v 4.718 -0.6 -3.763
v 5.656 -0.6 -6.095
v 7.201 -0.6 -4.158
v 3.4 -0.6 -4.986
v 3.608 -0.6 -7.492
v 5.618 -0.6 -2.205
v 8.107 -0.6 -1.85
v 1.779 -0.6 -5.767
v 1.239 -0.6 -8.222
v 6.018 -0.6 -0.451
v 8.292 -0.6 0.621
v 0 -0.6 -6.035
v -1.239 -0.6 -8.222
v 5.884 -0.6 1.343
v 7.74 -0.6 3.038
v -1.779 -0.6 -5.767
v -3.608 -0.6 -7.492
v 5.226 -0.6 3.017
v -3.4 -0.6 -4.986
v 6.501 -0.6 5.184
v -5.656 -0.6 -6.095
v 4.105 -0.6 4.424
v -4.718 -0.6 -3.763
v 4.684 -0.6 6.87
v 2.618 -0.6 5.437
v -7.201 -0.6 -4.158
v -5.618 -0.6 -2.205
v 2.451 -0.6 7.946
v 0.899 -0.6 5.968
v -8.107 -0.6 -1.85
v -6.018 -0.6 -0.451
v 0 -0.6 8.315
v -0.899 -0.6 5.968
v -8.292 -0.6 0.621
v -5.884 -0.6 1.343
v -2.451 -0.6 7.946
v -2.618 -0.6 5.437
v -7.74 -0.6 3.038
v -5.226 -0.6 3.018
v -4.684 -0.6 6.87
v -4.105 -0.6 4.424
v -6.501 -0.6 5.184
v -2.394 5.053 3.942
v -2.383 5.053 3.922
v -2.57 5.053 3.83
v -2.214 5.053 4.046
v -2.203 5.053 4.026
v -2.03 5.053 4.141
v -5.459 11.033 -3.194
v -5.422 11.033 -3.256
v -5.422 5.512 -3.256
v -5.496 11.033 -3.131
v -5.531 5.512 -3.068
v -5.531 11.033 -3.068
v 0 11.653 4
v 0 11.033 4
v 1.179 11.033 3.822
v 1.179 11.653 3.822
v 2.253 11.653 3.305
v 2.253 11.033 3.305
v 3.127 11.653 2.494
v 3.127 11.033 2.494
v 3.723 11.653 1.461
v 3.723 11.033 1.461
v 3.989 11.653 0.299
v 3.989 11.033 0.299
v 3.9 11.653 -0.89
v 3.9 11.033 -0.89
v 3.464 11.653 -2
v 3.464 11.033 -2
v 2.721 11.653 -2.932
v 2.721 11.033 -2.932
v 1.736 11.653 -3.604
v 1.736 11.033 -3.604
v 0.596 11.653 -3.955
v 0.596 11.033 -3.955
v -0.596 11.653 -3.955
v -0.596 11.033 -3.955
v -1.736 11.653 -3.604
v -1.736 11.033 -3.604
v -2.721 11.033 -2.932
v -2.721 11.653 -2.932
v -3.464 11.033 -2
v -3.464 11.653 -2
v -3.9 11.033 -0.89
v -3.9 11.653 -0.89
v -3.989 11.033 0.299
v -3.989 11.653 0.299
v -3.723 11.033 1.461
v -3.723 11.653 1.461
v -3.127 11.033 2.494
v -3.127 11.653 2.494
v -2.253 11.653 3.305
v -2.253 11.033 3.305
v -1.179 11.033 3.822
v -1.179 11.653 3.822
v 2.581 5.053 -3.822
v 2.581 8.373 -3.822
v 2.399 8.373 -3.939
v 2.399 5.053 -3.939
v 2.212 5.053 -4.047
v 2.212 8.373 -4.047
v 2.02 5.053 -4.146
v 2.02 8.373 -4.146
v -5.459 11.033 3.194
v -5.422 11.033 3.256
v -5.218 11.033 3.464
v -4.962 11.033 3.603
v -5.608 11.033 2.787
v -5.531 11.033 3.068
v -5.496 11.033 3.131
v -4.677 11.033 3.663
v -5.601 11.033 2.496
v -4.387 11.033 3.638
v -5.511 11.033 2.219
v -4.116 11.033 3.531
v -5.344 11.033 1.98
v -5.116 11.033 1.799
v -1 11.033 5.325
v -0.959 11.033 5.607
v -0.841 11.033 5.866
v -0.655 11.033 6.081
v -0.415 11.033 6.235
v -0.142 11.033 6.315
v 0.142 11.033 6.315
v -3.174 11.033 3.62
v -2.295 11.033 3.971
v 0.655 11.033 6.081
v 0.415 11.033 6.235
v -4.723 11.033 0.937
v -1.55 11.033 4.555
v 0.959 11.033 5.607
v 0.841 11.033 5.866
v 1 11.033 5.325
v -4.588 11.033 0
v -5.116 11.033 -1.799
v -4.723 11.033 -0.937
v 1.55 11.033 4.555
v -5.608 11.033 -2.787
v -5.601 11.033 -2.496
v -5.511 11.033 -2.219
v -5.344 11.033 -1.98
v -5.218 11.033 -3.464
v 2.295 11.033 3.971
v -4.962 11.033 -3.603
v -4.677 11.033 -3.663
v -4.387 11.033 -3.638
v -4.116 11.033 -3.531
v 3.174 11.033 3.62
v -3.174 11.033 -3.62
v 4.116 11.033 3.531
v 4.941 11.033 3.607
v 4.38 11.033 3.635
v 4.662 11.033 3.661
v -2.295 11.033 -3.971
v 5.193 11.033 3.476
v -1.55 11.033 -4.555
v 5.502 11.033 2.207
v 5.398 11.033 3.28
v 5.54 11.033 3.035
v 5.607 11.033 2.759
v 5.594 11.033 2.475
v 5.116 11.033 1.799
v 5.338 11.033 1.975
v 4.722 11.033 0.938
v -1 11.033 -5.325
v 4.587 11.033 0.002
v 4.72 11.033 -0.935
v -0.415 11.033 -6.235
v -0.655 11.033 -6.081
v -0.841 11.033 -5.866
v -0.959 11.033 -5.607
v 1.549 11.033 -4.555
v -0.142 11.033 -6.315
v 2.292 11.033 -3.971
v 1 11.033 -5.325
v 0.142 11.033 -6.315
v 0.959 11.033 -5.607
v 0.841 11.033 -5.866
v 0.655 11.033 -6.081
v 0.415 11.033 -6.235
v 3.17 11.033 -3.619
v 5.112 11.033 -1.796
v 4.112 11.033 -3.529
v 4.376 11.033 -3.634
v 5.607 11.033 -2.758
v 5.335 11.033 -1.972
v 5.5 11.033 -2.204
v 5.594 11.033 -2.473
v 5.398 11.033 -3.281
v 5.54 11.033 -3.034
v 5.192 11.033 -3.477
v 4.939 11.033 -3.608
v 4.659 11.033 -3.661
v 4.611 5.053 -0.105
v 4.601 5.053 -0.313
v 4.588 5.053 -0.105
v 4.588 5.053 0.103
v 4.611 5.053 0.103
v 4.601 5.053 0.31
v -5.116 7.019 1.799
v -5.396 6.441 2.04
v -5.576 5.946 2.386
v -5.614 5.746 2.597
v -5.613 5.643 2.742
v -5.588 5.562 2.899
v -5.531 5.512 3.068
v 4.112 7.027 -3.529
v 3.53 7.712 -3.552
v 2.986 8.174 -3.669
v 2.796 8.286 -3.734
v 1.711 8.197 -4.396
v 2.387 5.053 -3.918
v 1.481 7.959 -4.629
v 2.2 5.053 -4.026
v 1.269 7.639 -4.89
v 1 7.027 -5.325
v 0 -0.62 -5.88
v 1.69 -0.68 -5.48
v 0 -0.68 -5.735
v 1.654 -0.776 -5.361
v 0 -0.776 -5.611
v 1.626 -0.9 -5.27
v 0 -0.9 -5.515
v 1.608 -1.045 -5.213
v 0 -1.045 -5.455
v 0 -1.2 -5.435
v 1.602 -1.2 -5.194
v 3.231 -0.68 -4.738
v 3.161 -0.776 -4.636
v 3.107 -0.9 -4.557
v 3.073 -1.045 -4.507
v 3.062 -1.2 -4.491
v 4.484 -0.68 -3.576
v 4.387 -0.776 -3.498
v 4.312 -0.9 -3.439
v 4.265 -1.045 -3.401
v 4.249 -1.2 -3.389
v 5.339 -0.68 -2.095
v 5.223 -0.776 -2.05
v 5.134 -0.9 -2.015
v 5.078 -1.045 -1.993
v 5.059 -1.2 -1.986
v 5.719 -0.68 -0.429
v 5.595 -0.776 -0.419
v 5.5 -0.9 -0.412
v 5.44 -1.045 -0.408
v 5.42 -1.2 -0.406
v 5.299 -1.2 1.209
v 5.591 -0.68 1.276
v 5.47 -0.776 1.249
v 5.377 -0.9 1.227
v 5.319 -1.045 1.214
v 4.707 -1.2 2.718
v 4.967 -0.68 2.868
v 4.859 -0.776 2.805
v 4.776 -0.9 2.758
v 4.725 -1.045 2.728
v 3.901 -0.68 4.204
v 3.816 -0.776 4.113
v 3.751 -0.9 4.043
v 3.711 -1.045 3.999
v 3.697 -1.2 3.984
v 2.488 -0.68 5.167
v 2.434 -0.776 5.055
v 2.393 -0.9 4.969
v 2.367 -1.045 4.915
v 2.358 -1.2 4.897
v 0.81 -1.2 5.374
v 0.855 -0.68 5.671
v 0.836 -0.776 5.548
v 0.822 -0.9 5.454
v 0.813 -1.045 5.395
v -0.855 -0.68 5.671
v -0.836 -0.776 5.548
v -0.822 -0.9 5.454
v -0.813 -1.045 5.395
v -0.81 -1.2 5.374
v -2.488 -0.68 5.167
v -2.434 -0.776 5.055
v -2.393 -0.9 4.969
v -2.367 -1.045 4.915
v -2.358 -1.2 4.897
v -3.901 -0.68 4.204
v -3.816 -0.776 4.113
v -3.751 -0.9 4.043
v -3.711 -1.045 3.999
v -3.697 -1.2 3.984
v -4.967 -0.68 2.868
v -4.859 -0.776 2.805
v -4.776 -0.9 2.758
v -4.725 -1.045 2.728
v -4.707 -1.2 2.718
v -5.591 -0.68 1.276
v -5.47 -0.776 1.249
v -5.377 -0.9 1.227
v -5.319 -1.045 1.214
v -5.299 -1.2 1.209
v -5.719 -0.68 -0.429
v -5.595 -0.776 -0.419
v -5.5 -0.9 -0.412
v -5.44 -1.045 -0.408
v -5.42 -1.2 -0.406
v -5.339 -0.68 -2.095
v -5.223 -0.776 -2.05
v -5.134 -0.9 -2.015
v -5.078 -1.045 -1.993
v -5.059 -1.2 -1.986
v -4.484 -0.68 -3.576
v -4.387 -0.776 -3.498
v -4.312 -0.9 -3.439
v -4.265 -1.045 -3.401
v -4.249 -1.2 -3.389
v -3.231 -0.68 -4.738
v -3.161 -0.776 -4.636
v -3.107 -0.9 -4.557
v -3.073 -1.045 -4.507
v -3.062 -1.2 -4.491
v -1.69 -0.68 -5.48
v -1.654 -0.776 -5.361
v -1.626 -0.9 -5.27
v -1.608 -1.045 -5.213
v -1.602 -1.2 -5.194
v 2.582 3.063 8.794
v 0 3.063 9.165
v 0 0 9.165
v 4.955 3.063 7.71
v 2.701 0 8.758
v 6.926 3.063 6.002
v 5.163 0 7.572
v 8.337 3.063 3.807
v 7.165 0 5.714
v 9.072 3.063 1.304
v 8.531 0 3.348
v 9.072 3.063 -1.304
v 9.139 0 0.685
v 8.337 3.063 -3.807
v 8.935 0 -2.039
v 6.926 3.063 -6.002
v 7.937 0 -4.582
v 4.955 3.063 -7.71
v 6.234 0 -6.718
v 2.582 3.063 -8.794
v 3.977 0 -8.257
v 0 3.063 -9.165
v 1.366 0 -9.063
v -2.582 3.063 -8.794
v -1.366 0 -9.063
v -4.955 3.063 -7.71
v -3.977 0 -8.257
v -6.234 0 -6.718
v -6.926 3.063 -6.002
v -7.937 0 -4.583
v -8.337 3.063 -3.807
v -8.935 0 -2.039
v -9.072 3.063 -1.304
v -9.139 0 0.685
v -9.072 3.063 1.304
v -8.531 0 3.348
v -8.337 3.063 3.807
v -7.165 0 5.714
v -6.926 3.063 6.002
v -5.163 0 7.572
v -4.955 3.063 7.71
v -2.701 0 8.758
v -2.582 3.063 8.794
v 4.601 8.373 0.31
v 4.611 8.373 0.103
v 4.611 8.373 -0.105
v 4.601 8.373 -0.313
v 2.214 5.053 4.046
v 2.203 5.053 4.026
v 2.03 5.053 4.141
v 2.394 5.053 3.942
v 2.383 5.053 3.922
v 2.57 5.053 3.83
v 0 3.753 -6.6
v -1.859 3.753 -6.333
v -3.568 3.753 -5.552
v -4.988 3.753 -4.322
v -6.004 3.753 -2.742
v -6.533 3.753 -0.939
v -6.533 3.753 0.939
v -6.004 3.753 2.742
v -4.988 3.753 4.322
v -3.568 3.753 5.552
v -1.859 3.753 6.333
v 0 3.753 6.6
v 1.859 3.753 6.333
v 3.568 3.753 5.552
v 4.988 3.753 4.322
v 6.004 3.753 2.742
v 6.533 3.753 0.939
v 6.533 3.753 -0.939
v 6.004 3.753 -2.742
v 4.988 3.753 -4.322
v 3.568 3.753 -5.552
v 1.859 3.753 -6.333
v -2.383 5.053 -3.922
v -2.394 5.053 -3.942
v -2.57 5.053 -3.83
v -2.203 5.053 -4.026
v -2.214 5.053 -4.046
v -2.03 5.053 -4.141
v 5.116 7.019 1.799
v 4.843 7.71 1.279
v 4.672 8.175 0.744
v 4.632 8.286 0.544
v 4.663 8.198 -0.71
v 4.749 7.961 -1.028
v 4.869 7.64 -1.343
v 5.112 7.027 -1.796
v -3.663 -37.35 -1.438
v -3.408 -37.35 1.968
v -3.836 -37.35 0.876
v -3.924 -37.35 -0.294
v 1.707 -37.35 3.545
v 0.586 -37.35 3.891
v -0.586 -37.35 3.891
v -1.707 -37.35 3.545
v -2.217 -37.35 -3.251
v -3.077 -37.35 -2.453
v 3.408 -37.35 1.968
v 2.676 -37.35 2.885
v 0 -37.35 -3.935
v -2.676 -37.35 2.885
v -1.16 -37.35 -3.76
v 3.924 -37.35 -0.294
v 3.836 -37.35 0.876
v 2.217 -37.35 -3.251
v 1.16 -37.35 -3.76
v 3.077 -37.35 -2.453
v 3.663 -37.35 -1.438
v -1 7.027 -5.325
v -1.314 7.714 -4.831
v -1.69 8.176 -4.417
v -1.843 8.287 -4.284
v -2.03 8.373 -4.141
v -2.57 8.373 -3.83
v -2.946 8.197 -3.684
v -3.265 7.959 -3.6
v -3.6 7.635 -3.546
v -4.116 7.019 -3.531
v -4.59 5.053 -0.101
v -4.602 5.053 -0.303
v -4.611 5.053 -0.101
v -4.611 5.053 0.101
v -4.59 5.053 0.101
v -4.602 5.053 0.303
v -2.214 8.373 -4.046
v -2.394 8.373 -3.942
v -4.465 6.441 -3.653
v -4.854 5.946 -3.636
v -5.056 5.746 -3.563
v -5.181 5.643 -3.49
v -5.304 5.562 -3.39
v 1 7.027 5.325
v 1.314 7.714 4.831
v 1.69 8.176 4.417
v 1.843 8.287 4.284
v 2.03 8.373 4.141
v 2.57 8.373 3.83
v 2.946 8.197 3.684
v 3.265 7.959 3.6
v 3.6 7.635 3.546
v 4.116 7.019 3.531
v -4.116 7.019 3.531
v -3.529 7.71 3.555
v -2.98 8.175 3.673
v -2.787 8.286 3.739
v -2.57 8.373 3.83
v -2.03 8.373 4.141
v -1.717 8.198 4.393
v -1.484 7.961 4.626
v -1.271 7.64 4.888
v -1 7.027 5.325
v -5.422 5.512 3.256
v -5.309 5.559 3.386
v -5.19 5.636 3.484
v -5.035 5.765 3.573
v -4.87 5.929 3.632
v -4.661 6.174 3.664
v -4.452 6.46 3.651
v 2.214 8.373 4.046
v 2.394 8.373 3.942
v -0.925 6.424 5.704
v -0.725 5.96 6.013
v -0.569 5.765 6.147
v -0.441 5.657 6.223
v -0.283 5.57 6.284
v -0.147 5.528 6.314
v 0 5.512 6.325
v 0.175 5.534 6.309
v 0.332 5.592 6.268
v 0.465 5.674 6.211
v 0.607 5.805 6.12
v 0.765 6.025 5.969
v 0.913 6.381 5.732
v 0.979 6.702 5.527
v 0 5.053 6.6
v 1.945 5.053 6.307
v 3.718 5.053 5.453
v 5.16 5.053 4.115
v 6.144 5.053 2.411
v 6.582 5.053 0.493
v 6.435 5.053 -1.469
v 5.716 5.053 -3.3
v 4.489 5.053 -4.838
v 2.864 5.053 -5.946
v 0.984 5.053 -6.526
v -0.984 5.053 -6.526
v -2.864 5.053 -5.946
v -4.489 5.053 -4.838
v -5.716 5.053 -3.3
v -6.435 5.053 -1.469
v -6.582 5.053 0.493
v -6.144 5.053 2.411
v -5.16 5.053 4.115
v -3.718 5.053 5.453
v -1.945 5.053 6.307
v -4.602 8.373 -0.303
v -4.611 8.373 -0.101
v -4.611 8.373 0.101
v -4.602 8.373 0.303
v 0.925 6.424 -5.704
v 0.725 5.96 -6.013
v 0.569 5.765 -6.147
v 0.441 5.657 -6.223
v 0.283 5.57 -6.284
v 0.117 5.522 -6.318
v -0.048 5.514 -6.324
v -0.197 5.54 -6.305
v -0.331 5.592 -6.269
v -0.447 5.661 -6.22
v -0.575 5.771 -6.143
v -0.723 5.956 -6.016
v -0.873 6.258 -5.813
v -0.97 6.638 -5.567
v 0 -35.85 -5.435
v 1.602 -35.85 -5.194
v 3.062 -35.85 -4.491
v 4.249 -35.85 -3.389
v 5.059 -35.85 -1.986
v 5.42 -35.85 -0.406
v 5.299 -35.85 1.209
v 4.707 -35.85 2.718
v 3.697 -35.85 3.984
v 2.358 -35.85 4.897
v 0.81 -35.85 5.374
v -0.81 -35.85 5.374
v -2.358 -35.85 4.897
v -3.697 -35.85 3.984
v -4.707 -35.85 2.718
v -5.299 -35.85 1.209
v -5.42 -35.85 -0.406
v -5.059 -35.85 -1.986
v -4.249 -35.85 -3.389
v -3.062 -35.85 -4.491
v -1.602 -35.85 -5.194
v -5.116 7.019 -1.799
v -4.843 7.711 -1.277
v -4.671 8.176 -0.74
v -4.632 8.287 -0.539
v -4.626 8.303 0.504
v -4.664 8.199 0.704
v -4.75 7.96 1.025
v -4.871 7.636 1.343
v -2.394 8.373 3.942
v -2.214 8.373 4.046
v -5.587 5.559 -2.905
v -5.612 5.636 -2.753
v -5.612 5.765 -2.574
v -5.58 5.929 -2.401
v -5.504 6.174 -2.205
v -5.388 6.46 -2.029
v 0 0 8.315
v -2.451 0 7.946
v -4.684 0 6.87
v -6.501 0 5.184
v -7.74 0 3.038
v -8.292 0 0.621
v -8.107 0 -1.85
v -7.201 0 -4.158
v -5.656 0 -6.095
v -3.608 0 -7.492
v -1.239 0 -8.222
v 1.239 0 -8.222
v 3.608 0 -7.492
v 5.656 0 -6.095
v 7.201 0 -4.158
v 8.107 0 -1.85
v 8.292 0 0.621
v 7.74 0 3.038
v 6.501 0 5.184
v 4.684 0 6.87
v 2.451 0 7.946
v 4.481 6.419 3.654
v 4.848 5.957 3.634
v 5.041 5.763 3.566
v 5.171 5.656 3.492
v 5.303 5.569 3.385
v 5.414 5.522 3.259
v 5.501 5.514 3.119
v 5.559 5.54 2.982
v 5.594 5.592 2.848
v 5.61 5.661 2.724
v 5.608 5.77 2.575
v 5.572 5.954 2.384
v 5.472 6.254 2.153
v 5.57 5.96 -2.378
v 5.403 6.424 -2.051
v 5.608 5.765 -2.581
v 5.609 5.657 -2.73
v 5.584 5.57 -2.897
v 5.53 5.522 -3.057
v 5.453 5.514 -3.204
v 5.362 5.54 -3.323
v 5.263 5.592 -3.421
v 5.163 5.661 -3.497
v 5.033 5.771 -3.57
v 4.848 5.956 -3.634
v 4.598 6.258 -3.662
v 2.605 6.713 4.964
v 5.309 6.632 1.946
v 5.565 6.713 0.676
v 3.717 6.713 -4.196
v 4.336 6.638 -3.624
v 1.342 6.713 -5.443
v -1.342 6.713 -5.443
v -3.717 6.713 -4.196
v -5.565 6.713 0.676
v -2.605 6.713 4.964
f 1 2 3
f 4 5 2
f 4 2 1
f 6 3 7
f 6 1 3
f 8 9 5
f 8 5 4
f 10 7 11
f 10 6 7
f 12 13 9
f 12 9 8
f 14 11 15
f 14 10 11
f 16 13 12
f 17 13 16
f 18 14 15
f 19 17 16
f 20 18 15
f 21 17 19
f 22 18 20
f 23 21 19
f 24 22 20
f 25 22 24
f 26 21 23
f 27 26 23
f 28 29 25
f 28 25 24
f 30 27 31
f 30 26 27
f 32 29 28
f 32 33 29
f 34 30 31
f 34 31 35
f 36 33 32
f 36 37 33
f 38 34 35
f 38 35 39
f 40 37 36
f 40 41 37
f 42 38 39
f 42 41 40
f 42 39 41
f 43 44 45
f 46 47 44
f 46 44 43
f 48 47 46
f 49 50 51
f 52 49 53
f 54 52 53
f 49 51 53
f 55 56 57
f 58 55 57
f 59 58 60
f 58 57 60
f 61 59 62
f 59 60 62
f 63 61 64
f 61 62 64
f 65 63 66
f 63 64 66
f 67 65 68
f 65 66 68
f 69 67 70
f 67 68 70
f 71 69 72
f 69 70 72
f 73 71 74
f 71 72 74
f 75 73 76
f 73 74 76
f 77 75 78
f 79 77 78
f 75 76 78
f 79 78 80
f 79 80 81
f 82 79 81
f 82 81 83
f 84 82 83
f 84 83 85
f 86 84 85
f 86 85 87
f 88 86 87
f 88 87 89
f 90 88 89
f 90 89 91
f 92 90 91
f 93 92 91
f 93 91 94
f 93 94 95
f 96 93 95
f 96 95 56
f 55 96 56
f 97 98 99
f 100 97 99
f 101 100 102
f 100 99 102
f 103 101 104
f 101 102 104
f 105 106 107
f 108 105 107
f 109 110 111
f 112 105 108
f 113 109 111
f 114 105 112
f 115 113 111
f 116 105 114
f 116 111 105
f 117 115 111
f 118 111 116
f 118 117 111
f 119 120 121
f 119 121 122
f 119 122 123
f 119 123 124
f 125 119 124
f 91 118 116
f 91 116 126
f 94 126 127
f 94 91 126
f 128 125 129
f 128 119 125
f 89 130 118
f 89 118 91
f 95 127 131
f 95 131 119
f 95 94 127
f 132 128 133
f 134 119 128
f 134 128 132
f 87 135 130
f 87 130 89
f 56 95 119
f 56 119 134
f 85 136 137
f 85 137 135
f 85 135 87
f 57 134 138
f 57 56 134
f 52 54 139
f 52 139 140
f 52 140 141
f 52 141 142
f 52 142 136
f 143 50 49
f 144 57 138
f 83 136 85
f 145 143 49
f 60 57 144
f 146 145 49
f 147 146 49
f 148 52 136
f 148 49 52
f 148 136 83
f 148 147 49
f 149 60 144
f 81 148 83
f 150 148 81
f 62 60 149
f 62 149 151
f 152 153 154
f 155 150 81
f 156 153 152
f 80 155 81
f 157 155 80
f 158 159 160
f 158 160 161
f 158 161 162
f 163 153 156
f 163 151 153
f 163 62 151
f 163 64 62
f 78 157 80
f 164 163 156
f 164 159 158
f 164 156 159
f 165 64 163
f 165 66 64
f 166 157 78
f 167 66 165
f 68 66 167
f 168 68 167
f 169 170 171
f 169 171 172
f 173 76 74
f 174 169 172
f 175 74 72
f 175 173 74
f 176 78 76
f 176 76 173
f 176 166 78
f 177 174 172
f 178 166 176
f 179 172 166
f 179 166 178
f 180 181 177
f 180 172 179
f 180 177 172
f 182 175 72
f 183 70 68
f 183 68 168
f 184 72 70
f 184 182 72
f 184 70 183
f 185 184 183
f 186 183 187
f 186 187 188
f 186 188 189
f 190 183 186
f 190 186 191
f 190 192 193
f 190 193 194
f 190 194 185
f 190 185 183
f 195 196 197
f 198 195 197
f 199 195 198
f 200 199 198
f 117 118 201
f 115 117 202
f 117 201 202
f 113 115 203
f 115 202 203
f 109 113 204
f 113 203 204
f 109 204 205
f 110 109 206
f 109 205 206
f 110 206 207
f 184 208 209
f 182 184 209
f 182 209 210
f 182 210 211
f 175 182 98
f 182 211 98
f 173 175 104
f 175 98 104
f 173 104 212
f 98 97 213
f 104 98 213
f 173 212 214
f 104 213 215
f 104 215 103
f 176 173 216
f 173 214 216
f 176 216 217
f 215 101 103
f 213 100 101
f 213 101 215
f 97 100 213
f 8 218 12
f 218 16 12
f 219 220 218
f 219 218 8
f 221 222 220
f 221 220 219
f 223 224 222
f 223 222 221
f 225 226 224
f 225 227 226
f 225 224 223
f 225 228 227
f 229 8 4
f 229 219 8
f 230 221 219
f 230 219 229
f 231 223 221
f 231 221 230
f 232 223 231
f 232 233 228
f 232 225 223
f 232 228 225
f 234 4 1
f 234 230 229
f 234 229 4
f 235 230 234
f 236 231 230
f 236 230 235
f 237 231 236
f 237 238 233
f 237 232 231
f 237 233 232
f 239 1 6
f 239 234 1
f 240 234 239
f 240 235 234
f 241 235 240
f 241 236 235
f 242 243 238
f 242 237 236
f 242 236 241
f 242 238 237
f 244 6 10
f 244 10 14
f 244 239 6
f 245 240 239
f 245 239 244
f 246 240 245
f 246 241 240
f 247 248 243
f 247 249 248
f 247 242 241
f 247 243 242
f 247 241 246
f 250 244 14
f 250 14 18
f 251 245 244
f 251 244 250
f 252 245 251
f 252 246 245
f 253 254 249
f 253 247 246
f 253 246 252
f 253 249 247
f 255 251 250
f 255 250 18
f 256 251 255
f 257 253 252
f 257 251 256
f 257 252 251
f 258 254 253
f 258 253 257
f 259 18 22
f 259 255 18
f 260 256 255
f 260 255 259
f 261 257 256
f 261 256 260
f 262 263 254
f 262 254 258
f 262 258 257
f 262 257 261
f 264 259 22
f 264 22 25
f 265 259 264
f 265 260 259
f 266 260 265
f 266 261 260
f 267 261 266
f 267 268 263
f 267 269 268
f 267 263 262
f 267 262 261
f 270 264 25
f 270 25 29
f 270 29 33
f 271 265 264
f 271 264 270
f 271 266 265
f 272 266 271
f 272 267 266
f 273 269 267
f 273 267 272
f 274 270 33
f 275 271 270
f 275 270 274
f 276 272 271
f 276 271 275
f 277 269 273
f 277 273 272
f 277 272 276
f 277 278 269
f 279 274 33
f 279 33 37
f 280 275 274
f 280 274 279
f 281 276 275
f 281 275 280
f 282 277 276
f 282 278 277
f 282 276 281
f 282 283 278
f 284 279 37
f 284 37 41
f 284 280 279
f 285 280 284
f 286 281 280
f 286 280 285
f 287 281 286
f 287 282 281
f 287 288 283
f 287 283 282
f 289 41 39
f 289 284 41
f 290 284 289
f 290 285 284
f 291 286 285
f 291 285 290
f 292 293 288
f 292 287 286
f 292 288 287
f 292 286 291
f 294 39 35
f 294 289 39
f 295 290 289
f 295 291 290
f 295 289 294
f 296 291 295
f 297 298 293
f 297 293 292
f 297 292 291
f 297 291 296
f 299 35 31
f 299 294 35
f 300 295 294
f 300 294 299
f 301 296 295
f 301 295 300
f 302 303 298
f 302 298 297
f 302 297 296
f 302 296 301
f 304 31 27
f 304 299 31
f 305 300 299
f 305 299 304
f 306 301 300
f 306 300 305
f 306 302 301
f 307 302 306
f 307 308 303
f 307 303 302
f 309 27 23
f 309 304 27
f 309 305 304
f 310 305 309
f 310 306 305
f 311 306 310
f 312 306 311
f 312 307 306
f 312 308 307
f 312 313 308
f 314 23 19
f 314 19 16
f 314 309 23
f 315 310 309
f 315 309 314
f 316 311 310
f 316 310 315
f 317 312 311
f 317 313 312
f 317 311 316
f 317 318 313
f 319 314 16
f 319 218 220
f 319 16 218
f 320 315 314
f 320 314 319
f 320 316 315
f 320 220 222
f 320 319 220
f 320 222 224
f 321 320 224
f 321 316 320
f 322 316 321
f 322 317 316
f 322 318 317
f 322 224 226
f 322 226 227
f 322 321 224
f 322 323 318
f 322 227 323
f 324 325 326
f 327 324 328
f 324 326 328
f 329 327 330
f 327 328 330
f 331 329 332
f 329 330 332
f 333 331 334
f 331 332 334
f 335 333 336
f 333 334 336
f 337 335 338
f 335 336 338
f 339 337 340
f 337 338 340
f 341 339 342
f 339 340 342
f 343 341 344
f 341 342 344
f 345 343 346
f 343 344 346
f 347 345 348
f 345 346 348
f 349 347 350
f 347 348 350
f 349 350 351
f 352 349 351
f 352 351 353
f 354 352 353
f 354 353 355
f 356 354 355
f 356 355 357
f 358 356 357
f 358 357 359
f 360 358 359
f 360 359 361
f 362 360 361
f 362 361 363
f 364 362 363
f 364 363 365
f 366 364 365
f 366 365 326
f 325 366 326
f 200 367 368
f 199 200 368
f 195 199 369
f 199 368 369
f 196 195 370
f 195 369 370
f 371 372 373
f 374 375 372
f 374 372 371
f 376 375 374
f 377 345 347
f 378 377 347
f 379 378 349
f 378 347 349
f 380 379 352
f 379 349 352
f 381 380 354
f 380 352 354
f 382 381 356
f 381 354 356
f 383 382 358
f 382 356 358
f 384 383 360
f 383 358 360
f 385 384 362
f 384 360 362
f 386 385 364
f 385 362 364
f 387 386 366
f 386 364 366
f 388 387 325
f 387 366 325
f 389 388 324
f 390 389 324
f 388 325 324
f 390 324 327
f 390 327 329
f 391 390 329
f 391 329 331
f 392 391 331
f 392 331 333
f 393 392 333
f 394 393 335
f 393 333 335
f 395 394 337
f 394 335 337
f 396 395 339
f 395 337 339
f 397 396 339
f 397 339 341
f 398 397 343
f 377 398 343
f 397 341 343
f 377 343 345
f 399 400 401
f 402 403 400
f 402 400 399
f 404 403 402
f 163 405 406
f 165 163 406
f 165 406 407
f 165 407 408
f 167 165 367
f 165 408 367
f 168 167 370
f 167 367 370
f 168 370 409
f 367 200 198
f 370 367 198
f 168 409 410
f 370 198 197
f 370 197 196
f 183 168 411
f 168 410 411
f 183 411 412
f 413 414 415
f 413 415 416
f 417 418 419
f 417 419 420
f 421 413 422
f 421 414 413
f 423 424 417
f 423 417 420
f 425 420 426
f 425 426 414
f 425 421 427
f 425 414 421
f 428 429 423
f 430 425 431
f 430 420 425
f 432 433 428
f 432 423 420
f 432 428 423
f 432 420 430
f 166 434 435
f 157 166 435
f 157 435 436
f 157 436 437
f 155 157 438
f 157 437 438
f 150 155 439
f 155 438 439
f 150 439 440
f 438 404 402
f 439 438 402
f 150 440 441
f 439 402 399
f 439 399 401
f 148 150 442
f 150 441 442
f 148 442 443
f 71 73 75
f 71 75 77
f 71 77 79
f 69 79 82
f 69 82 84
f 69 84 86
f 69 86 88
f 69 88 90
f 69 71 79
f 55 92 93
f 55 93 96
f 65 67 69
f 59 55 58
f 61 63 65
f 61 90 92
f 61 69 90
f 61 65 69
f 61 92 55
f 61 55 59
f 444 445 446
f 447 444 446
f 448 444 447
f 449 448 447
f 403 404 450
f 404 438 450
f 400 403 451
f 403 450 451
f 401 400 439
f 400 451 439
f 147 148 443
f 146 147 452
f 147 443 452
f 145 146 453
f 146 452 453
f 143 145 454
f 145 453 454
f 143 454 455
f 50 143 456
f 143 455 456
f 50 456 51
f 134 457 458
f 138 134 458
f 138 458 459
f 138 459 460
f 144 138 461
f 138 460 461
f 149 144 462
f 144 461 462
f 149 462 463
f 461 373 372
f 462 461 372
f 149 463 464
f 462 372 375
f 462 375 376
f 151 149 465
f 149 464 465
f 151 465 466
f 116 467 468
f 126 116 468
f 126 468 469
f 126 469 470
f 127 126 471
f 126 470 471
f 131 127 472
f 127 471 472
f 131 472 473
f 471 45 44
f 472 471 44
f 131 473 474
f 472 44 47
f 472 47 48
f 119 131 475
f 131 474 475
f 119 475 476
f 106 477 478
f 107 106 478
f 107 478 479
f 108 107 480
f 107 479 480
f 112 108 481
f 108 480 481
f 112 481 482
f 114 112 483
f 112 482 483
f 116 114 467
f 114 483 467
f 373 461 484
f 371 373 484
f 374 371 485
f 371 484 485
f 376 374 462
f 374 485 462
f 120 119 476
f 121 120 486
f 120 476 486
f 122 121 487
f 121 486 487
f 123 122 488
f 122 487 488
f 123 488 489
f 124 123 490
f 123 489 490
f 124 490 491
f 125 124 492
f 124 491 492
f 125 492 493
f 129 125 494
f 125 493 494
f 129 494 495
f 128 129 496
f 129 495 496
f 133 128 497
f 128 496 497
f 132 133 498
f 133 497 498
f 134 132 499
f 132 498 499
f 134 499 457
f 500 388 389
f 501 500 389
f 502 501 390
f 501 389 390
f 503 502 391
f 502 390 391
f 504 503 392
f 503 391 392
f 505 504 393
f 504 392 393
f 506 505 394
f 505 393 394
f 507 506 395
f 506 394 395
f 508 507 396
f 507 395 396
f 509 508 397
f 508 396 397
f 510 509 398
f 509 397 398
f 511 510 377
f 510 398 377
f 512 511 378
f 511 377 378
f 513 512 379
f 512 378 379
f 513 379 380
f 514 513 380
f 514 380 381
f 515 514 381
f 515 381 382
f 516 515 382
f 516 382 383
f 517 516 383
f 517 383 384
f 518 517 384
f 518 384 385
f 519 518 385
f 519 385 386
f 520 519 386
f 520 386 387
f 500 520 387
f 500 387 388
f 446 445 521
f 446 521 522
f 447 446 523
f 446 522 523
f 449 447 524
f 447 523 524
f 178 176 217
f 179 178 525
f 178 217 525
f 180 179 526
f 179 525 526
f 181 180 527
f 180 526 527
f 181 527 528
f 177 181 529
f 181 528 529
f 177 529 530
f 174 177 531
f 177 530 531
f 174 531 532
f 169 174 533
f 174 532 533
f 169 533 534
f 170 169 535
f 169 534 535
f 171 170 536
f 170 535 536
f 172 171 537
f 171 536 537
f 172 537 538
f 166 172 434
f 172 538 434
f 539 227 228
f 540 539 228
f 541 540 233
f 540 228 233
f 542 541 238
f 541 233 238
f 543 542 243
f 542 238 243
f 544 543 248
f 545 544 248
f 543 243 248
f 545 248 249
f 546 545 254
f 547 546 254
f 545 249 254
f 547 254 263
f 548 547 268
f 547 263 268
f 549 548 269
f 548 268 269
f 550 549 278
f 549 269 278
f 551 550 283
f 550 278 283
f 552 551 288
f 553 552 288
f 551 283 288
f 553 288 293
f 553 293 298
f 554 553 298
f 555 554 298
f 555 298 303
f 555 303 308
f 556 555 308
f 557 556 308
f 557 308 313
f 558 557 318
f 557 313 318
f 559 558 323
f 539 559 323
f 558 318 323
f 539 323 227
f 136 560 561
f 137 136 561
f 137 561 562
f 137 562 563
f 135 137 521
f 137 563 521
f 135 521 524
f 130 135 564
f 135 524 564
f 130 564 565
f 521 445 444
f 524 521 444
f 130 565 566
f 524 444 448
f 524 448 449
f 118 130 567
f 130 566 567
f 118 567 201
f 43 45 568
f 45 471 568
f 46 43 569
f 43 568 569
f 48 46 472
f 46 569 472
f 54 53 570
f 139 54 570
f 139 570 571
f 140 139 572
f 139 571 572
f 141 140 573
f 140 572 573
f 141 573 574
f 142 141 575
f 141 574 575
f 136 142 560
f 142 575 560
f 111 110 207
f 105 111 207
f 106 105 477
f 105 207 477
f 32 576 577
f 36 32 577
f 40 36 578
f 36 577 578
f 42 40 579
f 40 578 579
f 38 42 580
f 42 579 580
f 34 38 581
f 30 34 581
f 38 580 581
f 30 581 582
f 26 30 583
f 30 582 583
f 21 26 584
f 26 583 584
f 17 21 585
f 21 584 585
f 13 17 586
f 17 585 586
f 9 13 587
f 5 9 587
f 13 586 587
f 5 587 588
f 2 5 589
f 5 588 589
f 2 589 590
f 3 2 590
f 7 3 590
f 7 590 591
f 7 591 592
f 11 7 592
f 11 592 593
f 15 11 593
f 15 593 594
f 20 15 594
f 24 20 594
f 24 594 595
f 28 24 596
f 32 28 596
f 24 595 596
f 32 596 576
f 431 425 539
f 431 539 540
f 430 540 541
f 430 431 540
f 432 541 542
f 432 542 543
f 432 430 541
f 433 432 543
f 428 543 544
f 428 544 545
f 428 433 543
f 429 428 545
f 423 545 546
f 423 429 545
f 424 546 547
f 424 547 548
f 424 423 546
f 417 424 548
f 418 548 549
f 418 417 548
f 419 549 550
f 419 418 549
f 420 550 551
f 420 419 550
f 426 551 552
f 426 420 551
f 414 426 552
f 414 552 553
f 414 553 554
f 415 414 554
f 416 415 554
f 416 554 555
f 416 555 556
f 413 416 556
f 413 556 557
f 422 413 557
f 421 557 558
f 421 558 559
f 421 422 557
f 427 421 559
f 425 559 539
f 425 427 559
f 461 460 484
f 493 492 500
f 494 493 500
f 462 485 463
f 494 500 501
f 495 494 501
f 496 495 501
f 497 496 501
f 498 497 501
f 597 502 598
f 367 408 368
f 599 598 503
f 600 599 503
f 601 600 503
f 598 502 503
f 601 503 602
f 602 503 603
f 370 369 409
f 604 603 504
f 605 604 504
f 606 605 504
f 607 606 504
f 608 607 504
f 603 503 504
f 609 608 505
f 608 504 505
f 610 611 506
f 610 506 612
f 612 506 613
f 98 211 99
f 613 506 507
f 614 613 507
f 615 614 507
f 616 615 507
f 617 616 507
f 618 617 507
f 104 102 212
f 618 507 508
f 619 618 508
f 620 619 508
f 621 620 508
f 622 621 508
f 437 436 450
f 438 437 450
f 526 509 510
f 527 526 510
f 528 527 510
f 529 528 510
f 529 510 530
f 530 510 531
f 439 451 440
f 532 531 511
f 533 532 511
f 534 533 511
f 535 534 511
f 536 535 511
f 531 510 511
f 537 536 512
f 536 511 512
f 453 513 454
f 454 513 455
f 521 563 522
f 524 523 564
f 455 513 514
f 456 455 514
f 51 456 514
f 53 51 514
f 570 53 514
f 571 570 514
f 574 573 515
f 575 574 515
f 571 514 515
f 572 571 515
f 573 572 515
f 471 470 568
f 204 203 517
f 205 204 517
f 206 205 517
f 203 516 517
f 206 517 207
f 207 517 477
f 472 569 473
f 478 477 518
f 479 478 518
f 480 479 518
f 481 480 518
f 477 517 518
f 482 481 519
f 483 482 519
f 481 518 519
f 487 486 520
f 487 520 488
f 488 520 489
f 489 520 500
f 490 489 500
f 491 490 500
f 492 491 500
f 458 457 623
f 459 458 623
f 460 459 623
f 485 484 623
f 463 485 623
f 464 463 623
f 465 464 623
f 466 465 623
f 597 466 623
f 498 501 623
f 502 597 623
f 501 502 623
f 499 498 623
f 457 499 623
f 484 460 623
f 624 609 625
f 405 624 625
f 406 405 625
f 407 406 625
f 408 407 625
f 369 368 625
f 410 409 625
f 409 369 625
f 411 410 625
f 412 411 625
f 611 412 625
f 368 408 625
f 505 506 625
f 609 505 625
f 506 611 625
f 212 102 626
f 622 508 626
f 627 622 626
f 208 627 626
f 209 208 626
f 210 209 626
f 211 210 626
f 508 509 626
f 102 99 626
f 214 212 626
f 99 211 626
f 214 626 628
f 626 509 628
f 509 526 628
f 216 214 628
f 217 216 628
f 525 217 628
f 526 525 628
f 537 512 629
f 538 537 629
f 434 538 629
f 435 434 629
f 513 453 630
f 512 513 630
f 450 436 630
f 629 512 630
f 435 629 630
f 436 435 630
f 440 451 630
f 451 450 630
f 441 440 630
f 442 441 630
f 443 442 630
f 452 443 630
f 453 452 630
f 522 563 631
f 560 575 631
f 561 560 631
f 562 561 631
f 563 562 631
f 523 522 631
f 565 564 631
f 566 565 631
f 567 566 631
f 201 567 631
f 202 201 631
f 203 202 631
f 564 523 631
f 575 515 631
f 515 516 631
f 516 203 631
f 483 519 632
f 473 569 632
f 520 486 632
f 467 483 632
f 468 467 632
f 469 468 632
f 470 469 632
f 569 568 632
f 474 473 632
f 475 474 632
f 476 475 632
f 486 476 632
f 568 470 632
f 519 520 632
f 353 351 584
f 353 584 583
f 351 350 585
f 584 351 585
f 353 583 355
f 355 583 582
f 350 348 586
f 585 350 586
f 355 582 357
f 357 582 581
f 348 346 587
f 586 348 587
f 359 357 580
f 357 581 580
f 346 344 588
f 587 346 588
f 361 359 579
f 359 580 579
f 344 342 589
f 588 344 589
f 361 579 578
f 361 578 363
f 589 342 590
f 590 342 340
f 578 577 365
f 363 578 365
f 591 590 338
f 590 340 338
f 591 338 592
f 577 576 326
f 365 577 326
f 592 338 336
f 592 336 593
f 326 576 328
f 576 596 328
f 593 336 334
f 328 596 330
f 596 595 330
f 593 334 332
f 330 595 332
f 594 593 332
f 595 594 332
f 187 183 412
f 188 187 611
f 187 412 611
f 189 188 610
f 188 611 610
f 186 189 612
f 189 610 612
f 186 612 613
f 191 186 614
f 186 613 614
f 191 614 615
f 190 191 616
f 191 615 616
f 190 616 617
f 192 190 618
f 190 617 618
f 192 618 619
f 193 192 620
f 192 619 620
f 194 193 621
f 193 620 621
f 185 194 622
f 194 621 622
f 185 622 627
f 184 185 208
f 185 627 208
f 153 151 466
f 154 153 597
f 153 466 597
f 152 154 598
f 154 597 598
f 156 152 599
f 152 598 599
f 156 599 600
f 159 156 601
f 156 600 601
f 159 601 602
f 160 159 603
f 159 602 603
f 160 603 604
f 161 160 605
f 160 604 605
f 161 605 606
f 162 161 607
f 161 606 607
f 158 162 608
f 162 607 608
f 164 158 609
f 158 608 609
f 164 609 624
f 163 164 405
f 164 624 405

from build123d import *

# Parameters (mm, degrees)
SKIZZE1_R                       = 9.165
AUFSATZ_LINEAR_AUSTRAGEN1_DEPTH = 3.063
SKIZZE20_R                      = 6.6
AUFSATZ_LINEAR_AUSTRAGEN4_DEPTH = 0.69
SKIZZE21_R                      = 6.6
AUFSATZ_LINEAR_AUSTRAGEN5_DEPTH = 1.3
SKIZZE22_R                      = 4
AUFSATZ_LINEAR_AUSTRAGEN6_DEPTH = 6.6
SKIZZE22_3_R                    = 4
AUFSATZ_LINEAR_AUSTRAGEN7_DEPTH = 5.98
SKIZZE28_R                      = 8.315
AUFSATZ_LINEAR_AUSTRAGEN8_DEPTH = 0.6
SKIZZE29_R                      = 5.435
AUFSATZ_LINEAR_AUSTRAGEN9_DEPTH = 36.75
VERRUNDUNG1_R                   = 0.6
FASE1_SIZE                      = 1.5


with BuildPart() as part:
    # Skizze1 → Aufsatz-Linear austragen1 (new body)
    with BuildSketch(Plane(origin=(0, 0, 0), x_dir=(1, 0, 0), z_dir=(0, 1, 0))):
        with Locations(Location((0, 0, 0), (0, 0, 270))):  # turned: the seam where the file's is
            Circle(SKIZZE1_R)
    extrude(amount=AUFSATZ_LINEAR_AUSTRAGEN1_DEPTH)

    # Skizze19 → Rotation1 (revolve)
    with BuildSketch(Plane.XY, mode=Mode.PRIVATE) as rotation1_sk:
        Polygon((6.6, 3.063), (6.6, 3.753), (9.165, 3.063), align=None)
    revolve(rotation1_sk.sketch.rotate(Axis((0, 0, 0), (0, 1, 0)), 90), axis=Axis((0, 0, 0), (0, 1, 0)))  # turned: the seam where the file's is

    # Skizze20 → Aufsatz-Linear austragen4 (add)
    with BuildSketch(Plane(origin=(0, 3.063, 0), x_dir=(1, 0, 0), z_dir=(0, 1, 0))):
        Circle(SKIZZE20_R)
    extrude(amount=AUFSATZ_LINEAR_AUSTRAGEN4_DEPTH)

    # Skizze21 → Aufsatz-Linear austragen5 (add)
    with BuildSketch(Plane(origin=(0, 3.753, 0), x_dir=(1, 0, 0), z_dir=(0, 1, 0))):
        with Locations(Location((0, 0, 0), (0, 0, 270))):  # turned: the seam where the file's is
            Circle(SKIZZE21_R)
    extrude(amount=AUFSATZ_LINEAR_AUSTRAGEN5_DEPTH)

    # Skizze22 → Aufsatz-Linear austragen6 (add)
    with BuildSketch(Plane(origin=(0, 5.053, 0), x_dir=(1, 0, 0), z_dir=(0, 1, 0))):
        with Locations(Location((0, 0, 0), (0, 0, 270))):  # turned: the seam where the file's is
            Circle(SKIZZE22_R)
    extrude(amount=AUFSATZ_LINEAR_AUSTRAGEN6_DEPTH)

    # Skizze22_3 → Aufsatz-Linear austragen7 (add)
    with BuildSketch(Plane(origin=(0, 5.053, 0), x_dir=(1, 0, 0), z_dir=(0, 1, 0))):
        with BuildLine():
            ThreePointArc((1, 5.325), (0, 6.325), (-1, 5.325))
            ThreePointArc((-1, 5.325), (-2.295031806, 3.971342442), (-4.115915402, 3.531025404))
            ThreePointArc((-4.115915402, 3.531025404), (-4.821728224, 3.643591377), (-5.42240304, 3.256250954))
            ThreePointArc((-5.42240304, 3.256250954), (-5.477610679, 3.1625), (-5.531197567, 3.067813305))
            ThreePointArc((-5.531197567, 3.067813305), (-5.566306805, 2.353943444), (-5.115915402, 1.798974596))
            ThreePointArc((-5.115915402, 1.798974596), (-4.588162786, 0), (-5.115915402, -1.798974596))
            ThreePointArc((-5.115915402, -1.798974596), (-5.566306805, -2.353943444), (-5.531197567, -3.067813305))
            ThreePointArc((-5.531197567, -3.067813305), (-5.477610679, -3.1625), (-5.42240304, -3.256250954))
            ThreePointArc((-5.42240304, -3.256250954), (-4.821728224, -3.643591377), (-4.115915402, -3.531025404))
            ThreePointArc((-4.115915402, -3.531025404), (-2.295031806, -3.971342442), (-1, -5.325))
            ThreePointArc((-1, -5.325), (0, -6.325), (1, -5.325))
            ThreePointArc((1, -5.325), (2.295031806, -3.971342442), (4.115915402, -3.531025404))
            ThreePointArc((4.115915402, -3.531025404), (5.477610679, -3.1625), (5.115915402, -1.798974596))
            ThreePointArc((5.115915402, -1.798974596), (4.586799345, -0.001884626), (5.111585275, 1.796474596))
            ThreePointArc((5.111585275, 1.796474596), (5.477610679, 3.1625), (4.111585275, 3.528525404))
            ThreePointArc((4.111585275, 3.528525404), (2.29239063, 3.970537041), (1, 5.325))
        make_face()
        with Locations(Location((0, 0, 0), (0, 0, 270))):  # turned: the seam where the file's is
            Circle(SKIZZE22_3_R, mode=Mode.SUBTRACT)
    extrude(amount=AUFSATZ_LINEAR_AUSTRAGEN7_DEPTH)

    # Skizze28 → Aufsatz-Linear austragen8 (add)
    with BuildSketch(Plane.XZ):
        with Locations(Location((0, 0, 0), (0, 0, 90))):  # turned: the seam where the file's is
            Circle(SKIZZE28_R)
    extrude(amount=AUFSATZ_LINEAR_AUSTRAGEN8_DEPTH)

    # Skizze29 → Aufsatz-Linear austragen9 (add)
    with BuildSketch(Plane.XZ.offset(0.6)):
        with Locations(Location((0, 0, 0), (0, 0, 270))):  # turned: the seam where the file's is
            Circle(SKIZZE29_R)
    extrude(amount=AUFSATZ_LINEAR_AUSTRAGEN9_DEPTH)

    # Verrundung1
    verrundung1_edges = [part.edges().sort_by_distance(p)[0] for p in [
        (0, -0.6, 5.435),
    ]]
    fillet(verrundung1_edges, radius=VERRUNDUNG1_R)

    # Skizze32 → Rotation3 (revolve)
    with BuildSketch(Plane.XY, mode=Mode.PRIVATE) as rotation3_sk:
        Polygon((4.611951316, 5.053), (4.611951316, 8.373), (6.6, 5.053), align=None)
    revolve(rotation3_sk.sketch.rotate(Axis((0, 0, 0), (0, 1, 0)), 270), axis=Axis((0, 0, 0), (0, 1, 0)))  # turned: the seam where the file's is

    # Fase1
    fase1_edges = [part.edges().sort_by_distance(p)[0] for p in [
        (0, -37.35, 5.435),
    ]]
    chamfer(fase1_edges, length=FASE1_SIZE)


solid = part.part
